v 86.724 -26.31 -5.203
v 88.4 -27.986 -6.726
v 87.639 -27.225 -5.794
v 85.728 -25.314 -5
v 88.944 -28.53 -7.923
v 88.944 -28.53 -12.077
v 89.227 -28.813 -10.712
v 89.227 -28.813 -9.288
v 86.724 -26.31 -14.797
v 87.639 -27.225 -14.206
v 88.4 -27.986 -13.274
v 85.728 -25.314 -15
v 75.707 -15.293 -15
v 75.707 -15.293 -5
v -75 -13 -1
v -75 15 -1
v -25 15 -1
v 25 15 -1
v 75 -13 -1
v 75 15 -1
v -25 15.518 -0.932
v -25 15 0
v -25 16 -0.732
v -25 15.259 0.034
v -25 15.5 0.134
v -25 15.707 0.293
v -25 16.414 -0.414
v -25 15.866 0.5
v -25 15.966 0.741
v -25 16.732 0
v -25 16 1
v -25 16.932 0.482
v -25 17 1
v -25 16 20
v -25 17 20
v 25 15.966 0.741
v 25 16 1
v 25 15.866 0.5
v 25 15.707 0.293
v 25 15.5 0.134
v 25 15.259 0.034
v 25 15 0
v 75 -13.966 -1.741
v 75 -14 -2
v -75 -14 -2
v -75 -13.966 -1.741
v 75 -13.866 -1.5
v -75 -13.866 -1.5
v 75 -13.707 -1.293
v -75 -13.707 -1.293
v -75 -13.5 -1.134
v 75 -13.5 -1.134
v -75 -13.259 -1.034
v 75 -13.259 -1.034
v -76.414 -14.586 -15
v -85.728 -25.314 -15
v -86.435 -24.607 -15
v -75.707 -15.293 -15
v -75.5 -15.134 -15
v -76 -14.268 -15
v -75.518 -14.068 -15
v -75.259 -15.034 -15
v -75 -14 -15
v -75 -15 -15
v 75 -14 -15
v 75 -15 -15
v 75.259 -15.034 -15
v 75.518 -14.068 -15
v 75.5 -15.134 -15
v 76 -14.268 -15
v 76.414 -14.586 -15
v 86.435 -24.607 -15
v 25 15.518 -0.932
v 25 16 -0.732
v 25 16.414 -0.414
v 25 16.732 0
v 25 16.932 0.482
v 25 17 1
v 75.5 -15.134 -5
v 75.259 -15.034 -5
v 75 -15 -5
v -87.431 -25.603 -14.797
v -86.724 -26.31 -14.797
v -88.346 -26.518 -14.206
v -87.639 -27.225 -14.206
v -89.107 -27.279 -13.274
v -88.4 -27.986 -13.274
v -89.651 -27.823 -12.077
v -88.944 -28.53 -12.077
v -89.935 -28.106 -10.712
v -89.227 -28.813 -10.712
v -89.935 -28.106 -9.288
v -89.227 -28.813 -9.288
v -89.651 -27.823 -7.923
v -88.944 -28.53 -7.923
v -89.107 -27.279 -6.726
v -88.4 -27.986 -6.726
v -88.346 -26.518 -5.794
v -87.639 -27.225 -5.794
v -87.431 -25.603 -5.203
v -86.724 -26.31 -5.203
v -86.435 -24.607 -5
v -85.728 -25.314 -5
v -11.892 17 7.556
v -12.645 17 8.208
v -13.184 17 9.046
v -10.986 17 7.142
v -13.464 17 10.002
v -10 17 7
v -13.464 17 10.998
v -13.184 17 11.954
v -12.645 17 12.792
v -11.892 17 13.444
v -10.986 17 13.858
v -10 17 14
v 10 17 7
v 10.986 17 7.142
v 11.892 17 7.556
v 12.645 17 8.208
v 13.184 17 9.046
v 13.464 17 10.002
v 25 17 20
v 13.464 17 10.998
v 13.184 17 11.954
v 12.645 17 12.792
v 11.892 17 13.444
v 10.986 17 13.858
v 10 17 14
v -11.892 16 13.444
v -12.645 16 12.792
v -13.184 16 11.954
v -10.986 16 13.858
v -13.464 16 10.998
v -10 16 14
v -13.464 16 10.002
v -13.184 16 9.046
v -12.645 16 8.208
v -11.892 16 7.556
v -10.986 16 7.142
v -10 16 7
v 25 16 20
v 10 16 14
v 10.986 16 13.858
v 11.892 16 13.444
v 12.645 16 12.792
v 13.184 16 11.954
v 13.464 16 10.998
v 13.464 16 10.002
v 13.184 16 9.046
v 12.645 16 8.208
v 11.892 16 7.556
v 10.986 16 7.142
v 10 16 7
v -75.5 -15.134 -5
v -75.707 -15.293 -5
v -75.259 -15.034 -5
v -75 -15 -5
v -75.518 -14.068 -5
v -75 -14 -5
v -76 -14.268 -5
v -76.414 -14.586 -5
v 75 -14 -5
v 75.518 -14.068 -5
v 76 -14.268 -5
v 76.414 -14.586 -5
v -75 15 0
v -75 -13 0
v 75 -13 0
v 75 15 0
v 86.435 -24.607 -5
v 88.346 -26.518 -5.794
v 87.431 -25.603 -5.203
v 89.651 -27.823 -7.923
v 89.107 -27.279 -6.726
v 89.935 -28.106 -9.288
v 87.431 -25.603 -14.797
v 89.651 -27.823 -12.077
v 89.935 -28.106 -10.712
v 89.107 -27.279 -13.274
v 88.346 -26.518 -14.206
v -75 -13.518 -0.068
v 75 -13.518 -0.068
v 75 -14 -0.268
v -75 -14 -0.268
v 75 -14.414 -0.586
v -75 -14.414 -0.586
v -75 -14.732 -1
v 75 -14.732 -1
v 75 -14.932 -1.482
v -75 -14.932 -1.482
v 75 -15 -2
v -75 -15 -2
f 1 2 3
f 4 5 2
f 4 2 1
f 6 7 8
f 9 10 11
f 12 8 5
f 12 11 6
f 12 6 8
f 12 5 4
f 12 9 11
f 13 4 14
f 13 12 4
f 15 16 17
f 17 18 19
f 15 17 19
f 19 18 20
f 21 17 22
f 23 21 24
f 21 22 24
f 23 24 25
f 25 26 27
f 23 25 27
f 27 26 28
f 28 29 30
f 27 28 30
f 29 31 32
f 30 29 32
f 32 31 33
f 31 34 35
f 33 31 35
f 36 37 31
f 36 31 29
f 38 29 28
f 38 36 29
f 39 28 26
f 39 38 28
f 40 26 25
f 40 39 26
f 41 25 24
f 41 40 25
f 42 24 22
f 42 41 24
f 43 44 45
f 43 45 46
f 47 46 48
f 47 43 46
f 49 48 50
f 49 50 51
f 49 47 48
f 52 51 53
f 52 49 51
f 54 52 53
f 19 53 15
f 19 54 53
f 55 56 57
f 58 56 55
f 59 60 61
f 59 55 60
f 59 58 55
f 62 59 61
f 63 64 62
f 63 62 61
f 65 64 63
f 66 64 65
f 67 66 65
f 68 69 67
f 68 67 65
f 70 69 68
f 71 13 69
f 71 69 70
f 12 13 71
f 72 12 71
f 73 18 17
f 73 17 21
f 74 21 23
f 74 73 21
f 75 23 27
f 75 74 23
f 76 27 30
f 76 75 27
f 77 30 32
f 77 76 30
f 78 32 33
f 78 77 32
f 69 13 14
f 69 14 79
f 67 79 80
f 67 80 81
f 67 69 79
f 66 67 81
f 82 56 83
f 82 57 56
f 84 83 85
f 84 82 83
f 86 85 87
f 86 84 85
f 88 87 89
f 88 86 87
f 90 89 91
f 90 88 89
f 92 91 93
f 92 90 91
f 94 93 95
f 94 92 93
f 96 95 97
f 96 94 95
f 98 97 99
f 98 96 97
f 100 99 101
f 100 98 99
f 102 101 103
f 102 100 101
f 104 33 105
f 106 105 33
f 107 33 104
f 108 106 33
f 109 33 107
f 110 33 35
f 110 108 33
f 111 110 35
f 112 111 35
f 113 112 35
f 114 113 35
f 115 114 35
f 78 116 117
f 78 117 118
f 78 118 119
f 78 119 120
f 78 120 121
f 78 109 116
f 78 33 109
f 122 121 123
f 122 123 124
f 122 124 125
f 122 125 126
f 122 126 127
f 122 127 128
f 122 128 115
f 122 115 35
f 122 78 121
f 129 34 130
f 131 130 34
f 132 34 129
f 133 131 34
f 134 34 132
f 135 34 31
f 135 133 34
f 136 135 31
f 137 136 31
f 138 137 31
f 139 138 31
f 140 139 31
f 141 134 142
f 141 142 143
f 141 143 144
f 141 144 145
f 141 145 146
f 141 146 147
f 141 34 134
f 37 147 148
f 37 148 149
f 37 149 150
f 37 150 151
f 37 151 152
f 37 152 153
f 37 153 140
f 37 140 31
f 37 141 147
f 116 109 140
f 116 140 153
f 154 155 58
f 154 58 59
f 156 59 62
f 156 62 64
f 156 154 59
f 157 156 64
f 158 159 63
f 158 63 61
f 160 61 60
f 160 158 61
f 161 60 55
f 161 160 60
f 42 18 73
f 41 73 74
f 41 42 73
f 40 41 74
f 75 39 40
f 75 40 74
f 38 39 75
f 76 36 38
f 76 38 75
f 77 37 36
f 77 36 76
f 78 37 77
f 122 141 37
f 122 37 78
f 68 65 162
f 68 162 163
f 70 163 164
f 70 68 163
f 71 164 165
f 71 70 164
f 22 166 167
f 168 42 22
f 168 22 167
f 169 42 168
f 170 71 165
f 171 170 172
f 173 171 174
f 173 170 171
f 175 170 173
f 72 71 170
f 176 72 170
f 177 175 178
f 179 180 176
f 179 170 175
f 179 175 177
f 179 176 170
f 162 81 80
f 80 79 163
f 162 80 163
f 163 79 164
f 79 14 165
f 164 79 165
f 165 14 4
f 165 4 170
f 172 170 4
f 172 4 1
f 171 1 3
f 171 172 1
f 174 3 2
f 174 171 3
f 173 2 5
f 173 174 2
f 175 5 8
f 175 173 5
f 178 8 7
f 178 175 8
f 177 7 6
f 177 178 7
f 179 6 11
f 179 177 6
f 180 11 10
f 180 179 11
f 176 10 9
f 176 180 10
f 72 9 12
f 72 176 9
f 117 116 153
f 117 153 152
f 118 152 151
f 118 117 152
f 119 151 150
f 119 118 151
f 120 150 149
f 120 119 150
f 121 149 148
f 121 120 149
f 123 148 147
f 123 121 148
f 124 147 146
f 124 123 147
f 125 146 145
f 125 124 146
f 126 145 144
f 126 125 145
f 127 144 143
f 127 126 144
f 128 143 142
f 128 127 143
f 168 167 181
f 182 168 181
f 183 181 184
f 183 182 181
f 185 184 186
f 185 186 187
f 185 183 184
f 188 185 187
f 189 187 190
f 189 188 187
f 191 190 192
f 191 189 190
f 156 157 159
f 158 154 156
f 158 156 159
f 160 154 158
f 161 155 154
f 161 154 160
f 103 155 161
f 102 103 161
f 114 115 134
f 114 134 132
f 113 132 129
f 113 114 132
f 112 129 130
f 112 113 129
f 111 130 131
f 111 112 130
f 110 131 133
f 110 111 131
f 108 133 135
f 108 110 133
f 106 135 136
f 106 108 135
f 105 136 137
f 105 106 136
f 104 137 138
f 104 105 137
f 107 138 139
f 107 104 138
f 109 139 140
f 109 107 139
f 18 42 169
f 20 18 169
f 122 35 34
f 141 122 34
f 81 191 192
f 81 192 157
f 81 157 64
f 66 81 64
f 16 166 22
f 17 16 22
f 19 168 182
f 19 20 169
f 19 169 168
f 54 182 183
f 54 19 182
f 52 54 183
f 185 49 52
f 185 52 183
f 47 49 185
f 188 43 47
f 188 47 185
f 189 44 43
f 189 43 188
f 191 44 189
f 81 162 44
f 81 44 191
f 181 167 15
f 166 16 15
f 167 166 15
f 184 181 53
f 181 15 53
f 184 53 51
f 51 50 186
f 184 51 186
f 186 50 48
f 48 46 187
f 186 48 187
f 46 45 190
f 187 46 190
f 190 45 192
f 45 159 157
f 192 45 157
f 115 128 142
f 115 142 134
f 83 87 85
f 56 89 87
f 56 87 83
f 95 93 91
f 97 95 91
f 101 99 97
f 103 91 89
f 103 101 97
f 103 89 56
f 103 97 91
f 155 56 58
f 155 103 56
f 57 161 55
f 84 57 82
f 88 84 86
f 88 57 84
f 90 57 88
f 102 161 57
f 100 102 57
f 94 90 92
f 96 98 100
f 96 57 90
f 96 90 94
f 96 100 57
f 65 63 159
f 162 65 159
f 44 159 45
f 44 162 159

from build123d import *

# Parameters (mm, degrees)
CROQUIS1_W                       = 150
CROQUIS1_H                       = 30
BRIDA_BASE1_DEPTH                = 1
BRIDA_DE_ARISTA1_DEPTH           = 50
BRIDA_DE_ARISTA2_STRIP_W         = 6
BRIDA_DE_ARISTA2_STRIP_H         = 1
BRIDA_DE_ARISTA2_STRIP_CUT_DEPTH = 150
BRIDA_DE_ARISTA2_DEPTH           = 150
BRIDA_DE_ARISTA3_DEPTH           = 10
BRIDA_DE_ARISTA3_BEND_DEPTH      = 10
REDONDEO1_RADIUS                 = 5
REDONDEO1_LENGTH                 = 1
REDONDEO2_RADIUS                 = 5
REDONDEO2_LENGTH                 = 1
CORTAR_EXTRUIR1_DEPTH            = 10


# Sheet-metal steps are written as plain solids
with BuildPart() as part:
    # Croquis1 → Brida base1 (new body)
    with BuildSketch(Plane.XY):
        Rectangle(CROQUIS1_W, CROQUIS1_H)
    extrude(amount=-BRIDA_BASE1_DEPTH)

    # Brida de arista1 section (across the edge) → Brida de arista1 (add)
    with BuildSketch(Plane(origin=(25, 16, 0), x_dir=(0, -1, 0), z_dir=(-1, 0, 0))):
        with BuildLine():
            Line((-1, 1), (-1, 20))
            Line((-1, 20), (0, 20))
            Line((0, 20), (0, 1))
            ThreePointArc((0, 1), (0.292893219, 0.292893219), (1, 0))
            Line((1, 0), (1, -1))
            ThreePointArc((1, -1), (-0.414213562, -0.414213562), (-1, 1))
        make_face()
    extrude(amount=BRIDA_DE_ARISTA1_DEPTH)

    # Brida de arista2 strip (across the edge) → Brida de arista2 strip cut (cut)
    with BuildSketch(Plane(origin=(75, -15, -1), x_dir=(0, 1, 0), z_dir=(-1, 0, 0))):
        with Locations((-1, -0.5)):
            Rectangle(BRIDA_DE_ARISTA2_STRIP_W, BRIDA_DE_ARISTA2_STRIP_H)
    extrude(amount=BRIDA_DE_ARISTA2_STRIP_CUT_DEPTH, mode=Mode.SUBTRACT)

    # Brida de arista2 section (across the edge) → Brida de arista2 (add)
    with BuildSketch(Plane(origin=(75, -15, -1), x_dir=(0, 1, 0), z_dir=(-1, 0, 0))):
        with BuildLine():
            Line((0, 1), (0, 14))
            Line((0, 14), (1, 14))
            Line((1, 14), (1, 1))
            ThreePointArc((1, 1), (1.292893219, 0.292893219), (2, 0))
            Line((2, 0), (2, -1))
            ThreePointArc((2, -1), (0.585786438, -0.414213562), (0, 1))
        make_face()
    extrude(amount=BRIDA_DE_ARISTA2_DEPTH)

    # Brida de arista3 section (across the edge) → Brida de arista3 (add)
    with BuildSketch(Plane(origin=(-75.414213562, -15, -5), x_dir=(0.7071067811865439, -0.7071067811865511, 1.6984173230954452e-15), z_dir=(0, 0, -1))):
        with BuildLine():
            Line((-1, 0.414213562), (-1, 19.585786438))
            Line((-1, 19.585786438), (0, 19.585786438))
            Line((0, 19.585786438), (0, 0.414213562))
            ThreePointArc((0, 0.414213562), (0.076120467, 0.03153013), (0.292893219, -0.292893219))
            Line((0.292893219, -0.292893219), (-0.414213562, -1))
            ThreePointArc((-0.414213562, -1), (-0.847759065, -0.351153302), (-1, 0.414213562))
        make_face()
    extrude(amount=BRIDA_DE_ARISTA3_DEPTH)

    # Brida de arista3 section 2 (across the edge) → Brida de arista3 bend (add)
    with BuildSketch(Plane(origin=(75.414213562, -15, -15), x_dir=(-0.7071067811865437, -0.7071067811865513, 3.0194085743918815e-15), z_dir=(0, 0, 1))):
        with BuildLine():
            Line((-1, 0.414213562), (-1, 19.585786438))
            Line((-1, 19.585786438), (0, 19.585786438))
            Line((0, 19.585786438), (0, 0.414213562))
            ThreePointArc((0, 0.414213562), (0.076120467, 0.03153013), (0.292893219, -0.292893219))
            Line((0.292893219, -0.292893219), (-0.414213562, -1))
            ThreePointArc((-0.414213562, -1), (-0.847759065, -0.351153302), (-1, 0.414213562))
        make_face()
    extrude(amount=BRIDA_DE_ARISTA3_BEND_DEPTH)

    # Redondeo1: full round fillet: the end face becomes a half cylinder, R = half its width
    redondeo1_face = Plane((-89.617009358, -28.495689014, -10), x_dir=(-0.707106781187, 0.707106781187, 0), z_dir=(-0.707106781187, -0.707106781187, 0))  # on the end face: x along it, z out of the body
    redondeo1_slab = redondeo1_face.offset(-REDONDEO1_RADIUS / 2) * Box(REDONDEO1_LENGTH, 2 * REDONDEO1_RADIUS, REDONDEO1_RADIUS, mode=Mode.PRIVATE)  # the body's end, R deep
    redondeo1_round = Plane((-86.081475452, -24.960155108, -10), x_dir=(-0.707106781187, -0.707106781187, 0), z_dir=(-0.707106781187, 0.707106781187, 0)) * Cylinder(REDONDEO1_RADIUS, REDONDEO1_LENGTH, mode=Mode.PRIVATE)  # its axis R under the face
    add(redondeo1_slab - redondeo1_round, mode=Mode.SUBTRACT)

    # Redondeo2: full round fillet: the end face becomes a half cylinder, R = half its width
    redondeo2_face = Plane((89.617009358, -28.495689014, -10), x_dir=(0.707106781187, 0.707106781187, 0), z_dir=(0.707106781187, -0.707106781187, 0))  # on the end face: x along it, z out of the body
    redondeo2_slab = redondeo2_face.offset(-REDONDEO2_RADIUS / 2) * Box(REDONDEO2_LENGTH, 2 * REDONDEO2_RADIUS, REDONDEO2_RADIUS, mode=Mode.PRIVATE)  # the body's end, R deep
    redondeo2_round = Plane((86.081475452, -24.960155108, -10), x_dir=(0.707106781187, -0.707106781187, 0), z_dir=(0.707106781187, 0.707106781187, 0)) * Cylinder(REDONDEO2_RADIUS, REDONDEO2_LENGTH, mode=Mode.PRIVATE)  # its axis R under the face
    add(redondeo2_slab - redondeo2_round, mode=Mode.SUBTRACT)

    # Croquis18 → Cortar-Extruir1 (cut)
    with BuildSketch(Plane(origin=(0, 17, 0), x_dir=(1, 0, 0), z_dir=(0, 1, 0))):
        with BuildLine():
            Line((10, -14), (-10, -14))
            ThreePointArc((-10, -14), (-13.5, -10.5), (-10, -7))
            Line((-10, -7), (10, -7))
            ThreePointArc((10, -7), (13.5, -10.5), (10, -14))
        make_face()
    extrude(amount=-CORTAR_EXTRUIR1_DEPTH, mode=Mode.SUBTRACT)


solid = part.part
